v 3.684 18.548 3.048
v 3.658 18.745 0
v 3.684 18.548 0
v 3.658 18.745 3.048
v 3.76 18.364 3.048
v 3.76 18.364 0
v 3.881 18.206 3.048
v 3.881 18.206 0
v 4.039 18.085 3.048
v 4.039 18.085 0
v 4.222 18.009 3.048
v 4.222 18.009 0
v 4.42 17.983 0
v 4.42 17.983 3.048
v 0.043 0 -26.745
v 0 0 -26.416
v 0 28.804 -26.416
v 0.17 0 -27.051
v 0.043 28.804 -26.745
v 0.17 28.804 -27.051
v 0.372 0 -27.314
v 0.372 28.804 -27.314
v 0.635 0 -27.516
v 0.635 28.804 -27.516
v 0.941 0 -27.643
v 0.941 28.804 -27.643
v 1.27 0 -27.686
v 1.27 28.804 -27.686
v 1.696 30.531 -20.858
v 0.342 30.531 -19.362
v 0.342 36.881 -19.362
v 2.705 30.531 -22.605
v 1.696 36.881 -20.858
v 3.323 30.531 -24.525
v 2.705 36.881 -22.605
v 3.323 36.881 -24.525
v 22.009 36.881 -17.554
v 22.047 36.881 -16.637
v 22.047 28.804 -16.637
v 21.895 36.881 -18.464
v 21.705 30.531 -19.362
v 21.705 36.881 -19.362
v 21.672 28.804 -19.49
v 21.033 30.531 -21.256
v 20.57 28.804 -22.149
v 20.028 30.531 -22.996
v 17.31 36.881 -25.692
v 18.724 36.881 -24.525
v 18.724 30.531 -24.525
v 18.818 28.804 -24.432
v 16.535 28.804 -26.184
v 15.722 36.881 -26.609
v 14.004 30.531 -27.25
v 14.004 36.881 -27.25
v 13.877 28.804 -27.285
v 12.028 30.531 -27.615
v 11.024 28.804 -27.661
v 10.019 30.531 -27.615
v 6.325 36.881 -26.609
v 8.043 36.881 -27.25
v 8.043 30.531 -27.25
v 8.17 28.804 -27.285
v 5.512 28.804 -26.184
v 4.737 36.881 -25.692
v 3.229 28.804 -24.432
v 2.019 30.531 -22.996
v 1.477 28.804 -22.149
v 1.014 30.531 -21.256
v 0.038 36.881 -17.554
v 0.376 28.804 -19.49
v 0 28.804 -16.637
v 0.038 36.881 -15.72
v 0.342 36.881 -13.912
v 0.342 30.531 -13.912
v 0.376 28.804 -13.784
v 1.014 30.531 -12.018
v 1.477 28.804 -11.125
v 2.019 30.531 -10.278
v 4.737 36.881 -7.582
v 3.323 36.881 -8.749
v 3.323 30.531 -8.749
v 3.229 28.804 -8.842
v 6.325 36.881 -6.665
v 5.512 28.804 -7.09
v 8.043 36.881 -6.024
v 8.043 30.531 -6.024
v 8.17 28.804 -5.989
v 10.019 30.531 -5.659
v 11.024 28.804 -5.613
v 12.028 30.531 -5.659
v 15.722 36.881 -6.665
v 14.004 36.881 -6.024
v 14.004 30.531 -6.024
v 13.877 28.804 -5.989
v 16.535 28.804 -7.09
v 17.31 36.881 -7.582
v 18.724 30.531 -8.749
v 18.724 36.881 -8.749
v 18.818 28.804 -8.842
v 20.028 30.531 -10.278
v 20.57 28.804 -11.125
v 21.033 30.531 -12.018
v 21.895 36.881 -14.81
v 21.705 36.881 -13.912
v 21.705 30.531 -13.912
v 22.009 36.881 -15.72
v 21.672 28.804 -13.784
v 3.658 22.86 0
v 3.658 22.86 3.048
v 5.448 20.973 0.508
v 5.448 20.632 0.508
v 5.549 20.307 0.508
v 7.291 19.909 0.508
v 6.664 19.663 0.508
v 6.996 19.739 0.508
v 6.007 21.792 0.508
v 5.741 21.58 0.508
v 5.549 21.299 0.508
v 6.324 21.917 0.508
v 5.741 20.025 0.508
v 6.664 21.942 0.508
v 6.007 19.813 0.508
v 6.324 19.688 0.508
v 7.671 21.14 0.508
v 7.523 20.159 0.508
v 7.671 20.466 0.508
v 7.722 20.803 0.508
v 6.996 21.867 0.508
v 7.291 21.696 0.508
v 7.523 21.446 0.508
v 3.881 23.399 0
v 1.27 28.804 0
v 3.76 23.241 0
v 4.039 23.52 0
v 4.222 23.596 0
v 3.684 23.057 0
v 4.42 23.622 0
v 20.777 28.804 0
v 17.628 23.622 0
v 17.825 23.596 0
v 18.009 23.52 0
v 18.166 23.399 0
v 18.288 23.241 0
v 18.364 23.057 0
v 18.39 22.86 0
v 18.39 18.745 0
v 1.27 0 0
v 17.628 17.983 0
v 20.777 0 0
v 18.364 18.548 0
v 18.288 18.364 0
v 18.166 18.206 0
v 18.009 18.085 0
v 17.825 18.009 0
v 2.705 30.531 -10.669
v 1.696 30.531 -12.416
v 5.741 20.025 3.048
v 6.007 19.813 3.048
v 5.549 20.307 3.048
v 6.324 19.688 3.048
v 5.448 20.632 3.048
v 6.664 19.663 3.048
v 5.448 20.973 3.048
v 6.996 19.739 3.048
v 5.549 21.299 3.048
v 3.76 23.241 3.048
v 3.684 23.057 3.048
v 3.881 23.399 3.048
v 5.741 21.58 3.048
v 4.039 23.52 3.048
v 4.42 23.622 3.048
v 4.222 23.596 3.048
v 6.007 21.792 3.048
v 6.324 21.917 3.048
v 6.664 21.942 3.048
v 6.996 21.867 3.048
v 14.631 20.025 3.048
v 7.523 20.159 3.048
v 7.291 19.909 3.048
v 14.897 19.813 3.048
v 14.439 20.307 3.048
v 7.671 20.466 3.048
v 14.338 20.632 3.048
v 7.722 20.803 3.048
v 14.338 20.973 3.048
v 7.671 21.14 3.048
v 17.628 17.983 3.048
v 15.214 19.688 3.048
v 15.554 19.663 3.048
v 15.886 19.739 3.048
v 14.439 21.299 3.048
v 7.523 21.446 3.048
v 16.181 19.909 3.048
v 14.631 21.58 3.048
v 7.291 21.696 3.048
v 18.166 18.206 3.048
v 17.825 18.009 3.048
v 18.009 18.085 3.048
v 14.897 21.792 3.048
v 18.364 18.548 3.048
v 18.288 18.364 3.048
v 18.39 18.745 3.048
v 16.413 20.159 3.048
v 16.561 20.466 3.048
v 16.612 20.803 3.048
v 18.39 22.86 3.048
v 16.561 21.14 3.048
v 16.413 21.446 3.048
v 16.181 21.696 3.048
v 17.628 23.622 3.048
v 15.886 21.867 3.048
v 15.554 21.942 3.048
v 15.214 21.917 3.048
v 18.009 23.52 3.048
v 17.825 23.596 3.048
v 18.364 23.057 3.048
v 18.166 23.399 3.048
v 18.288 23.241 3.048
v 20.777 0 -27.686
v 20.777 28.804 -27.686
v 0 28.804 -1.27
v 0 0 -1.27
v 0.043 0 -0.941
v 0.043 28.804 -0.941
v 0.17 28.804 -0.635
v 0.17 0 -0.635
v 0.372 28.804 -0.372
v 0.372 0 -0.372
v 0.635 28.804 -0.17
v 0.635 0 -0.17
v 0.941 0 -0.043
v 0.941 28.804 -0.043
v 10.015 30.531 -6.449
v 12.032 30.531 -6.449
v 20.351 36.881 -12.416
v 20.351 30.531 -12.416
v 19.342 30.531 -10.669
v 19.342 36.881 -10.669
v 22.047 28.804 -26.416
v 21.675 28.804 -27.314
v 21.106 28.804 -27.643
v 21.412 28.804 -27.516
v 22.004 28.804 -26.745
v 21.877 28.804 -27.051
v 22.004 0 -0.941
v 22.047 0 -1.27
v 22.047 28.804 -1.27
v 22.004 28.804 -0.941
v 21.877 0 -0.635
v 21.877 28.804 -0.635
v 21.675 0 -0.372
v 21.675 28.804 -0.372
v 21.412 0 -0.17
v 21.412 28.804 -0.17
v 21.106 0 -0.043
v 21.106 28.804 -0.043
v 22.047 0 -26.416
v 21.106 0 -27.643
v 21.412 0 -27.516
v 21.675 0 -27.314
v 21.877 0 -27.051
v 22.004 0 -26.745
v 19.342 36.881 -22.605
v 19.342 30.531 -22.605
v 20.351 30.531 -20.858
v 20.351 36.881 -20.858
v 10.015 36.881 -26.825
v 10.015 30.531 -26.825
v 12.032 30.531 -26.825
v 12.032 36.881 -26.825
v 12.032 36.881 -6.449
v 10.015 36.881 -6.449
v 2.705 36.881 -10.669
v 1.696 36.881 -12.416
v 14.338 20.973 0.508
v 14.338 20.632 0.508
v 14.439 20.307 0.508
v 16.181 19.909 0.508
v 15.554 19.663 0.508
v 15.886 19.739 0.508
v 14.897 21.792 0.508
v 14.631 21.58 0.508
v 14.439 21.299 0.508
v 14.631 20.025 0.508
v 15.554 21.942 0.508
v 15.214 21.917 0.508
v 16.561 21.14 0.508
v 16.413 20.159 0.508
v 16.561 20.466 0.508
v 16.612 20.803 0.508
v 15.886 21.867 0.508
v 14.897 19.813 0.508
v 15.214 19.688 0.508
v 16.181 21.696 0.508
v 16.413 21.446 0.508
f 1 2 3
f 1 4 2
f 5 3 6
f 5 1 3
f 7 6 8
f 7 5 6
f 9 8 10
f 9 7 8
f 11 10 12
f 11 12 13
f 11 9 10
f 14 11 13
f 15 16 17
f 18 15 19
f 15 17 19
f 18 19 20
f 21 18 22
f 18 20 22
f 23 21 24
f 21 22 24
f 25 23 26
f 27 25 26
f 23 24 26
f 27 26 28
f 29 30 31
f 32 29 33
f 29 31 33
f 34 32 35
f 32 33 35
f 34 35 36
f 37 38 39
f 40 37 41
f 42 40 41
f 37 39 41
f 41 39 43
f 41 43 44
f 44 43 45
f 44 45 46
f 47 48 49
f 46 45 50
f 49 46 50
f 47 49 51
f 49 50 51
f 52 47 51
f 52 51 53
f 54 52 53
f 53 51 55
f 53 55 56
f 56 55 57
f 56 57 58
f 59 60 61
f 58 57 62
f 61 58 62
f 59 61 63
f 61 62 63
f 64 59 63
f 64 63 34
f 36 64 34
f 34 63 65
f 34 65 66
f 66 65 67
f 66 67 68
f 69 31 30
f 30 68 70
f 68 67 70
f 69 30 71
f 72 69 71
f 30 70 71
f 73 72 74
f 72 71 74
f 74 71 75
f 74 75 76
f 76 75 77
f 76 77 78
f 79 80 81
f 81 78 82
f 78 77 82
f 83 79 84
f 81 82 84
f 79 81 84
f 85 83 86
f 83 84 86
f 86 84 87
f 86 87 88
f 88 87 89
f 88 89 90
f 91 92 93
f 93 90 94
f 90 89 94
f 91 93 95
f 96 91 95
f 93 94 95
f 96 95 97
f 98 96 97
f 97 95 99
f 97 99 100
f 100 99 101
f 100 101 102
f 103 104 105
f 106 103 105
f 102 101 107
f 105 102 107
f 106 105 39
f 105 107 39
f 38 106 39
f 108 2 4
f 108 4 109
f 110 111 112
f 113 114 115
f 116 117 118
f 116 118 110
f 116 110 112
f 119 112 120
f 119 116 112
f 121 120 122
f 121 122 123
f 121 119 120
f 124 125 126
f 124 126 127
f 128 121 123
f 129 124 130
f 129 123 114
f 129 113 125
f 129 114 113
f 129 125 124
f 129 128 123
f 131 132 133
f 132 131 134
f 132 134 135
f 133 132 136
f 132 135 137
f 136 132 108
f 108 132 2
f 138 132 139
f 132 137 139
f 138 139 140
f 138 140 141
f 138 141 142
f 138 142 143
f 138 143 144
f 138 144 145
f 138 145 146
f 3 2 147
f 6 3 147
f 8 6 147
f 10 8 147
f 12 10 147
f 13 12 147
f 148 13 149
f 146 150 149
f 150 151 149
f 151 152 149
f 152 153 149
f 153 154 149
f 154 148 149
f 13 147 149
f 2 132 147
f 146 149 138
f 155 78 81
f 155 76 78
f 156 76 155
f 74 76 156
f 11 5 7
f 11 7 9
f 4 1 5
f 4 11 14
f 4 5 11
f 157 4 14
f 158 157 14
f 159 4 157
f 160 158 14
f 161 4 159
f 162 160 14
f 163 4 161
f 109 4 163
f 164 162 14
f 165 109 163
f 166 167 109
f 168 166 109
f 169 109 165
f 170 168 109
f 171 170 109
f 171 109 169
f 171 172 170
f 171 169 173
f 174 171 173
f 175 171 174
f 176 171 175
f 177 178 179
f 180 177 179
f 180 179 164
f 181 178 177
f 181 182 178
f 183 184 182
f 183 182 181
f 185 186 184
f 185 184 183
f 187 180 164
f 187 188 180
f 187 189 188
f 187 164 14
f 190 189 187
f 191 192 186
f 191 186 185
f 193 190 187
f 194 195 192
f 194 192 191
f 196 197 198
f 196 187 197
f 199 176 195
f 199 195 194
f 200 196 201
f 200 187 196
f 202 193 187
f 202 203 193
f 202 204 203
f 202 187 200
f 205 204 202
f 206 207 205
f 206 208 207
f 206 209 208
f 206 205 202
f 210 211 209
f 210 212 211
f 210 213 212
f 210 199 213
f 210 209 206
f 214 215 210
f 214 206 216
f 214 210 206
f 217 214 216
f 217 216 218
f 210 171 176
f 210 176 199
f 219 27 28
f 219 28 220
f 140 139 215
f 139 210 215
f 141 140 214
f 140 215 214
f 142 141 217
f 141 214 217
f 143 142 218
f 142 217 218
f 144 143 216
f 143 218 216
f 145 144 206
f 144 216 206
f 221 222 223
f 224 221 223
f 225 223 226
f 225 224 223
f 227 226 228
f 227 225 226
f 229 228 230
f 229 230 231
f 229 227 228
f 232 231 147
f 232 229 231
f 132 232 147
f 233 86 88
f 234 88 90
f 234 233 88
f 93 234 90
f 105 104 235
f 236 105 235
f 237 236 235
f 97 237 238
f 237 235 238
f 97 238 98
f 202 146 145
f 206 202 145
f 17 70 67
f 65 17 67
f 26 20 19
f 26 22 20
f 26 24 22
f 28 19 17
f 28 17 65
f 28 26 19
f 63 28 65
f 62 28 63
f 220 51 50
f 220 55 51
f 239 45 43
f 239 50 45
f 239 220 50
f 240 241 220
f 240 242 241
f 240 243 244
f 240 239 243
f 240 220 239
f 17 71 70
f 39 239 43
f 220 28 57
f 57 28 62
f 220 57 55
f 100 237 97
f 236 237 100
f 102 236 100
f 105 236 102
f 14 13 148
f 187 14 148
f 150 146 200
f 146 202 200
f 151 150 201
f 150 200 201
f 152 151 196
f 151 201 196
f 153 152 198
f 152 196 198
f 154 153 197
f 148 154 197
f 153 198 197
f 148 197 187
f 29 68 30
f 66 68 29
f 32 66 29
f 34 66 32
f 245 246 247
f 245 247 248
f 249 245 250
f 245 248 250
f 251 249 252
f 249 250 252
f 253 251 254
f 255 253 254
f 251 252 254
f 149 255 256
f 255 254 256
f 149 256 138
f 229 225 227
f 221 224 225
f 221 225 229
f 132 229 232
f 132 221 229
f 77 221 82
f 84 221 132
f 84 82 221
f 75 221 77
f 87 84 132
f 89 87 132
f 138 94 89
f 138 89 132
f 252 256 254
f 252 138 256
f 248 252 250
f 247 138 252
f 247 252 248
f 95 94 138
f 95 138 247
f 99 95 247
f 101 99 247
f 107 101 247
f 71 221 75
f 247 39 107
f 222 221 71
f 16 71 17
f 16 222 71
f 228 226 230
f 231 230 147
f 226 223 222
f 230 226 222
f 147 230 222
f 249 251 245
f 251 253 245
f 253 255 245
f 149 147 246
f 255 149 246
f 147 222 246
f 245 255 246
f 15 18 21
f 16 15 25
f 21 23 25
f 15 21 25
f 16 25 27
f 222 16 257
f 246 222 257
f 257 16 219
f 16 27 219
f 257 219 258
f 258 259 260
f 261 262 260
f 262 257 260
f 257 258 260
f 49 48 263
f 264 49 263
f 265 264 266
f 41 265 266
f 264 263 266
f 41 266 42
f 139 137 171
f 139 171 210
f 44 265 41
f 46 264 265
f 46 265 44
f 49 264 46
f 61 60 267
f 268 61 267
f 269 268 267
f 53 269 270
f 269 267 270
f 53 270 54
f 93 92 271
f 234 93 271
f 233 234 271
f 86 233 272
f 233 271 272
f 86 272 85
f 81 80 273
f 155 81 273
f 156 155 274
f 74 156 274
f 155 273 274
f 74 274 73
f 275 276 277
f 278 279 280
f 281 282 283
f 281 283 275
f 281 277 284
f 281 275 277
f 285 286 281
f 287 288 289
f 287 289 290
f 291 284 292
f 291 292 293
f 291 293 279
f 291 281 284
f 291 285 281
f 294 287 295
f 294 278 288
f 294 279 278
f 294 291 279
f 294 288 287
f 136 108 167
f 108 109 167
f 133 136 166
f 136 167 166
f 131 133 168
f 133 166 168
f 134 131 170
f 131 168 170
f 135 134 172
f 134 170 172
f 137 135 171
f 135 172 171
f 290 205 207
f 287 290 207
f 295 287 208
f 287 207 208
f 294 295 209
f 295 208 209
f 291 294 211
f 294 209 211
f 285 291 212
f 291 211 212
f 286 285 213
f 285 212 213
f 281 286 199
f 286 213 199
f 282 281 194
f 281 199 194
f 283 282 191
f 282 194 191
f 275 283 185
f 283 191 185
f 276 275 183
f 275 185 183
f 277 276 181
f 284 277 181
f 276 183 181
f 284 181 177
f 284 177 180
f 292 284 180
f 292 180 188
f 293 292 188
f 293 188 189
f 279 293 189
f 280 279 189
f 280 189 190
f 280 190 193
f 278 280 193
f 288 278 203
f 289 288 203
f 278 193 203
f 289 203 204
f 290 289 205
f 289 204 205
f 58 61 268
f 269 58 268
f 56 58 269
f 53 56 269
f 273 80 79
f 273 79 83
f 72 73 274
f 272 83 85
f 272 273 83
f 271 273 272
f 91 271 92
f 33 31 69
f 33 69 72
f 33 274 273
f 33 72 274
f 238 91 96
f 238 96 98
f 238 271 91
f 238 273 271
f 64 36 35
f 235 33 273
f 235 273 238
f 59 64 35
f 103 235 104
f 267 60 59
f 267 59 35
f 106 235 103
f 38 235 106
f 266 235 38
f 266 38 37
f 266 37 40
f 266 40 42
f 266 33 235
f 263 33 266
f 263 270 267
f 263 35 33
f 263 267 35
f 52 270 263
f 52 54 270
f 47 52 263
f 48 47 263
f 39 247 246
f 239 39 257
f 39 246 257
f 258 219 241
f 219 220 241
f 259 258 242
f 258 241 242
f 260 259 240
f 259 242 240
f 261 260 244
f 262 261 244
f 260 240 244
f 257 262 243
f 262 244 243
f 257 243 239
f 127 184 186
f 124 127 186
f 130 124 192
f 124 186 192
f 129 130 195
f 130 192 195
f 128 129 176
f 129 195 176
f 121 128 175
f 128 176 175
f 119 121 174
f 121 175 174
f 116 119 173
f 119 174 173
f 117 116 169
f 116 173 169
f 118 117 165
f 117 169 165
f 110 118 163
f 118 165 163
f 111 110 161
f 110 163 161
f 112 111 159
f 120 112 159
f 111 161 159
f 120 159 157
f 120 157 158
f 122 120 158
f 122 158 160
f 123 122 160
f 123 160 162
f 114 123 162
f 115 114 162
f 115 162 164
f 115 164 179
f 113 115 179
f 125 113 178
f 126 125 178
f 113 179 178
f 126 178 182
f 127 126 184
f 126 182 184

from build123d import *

# Parameters (mm, degrees)
SKETCH1_W           = 22.0472
SKETCH1_H           = 27.686
BOSS_EXTRUDE1_DEPTH = 28.8036
SKETCH2_W           = 14.732
SKETCH2_H           = 5.6388
BOSS_EXTRUDE2_DEPTH = 3.048
SKETCH3_R           = 11.0236
BOSS_EXTRUDE3_DEPTH = 8.0772
SKETCH4_R           = 9.525
CUT_EXTRUDE1_DEPTH  = 6.35
FILLET1_R           = 1.27
FILLET2_R           = 0.762
SKETCH5_R           = 1.143
CUT_EXTRUDE2_DEPTH  = 2.54


with BuildPart() as part:
    # Sketch1 → Boss-Extrude1 (new body)
    with BuildSketch(Plane(origin=(0, 0, 0), x_dir=(1, 0, 0), z_dir=(0, 1, 0))):
        with Locations((11.0236, 13.843)):
            Rectangle(SKETCH1_W, SKETCH1_H)
    extrude(amount=BOSS_EXTRUDE1_DEPTH)

    # Sketch2 → Boss-Extrude2 (add)
    with BuildSketch(Plane.XY):
        with Locations((11.0236, 20.8026)):
            Rectangle(SKETCH2_W, SKETCH2_H)
    extrude(amount=BOSS_EXTRUDE2_DEPTH)

    # Sketch3 → Boss-Extrude3 (add)
    with BuildSketch(Plane(origin=(0, 28.8036, 0), x_dir=(1, 0, 0), z_dir=(0, 1, 0))):
        with Locations((11.0236, 16.637)):
            Circle(SKETCH3_R)
    extrude(amount=BOSS_EXTRUDE3_DEPTH)

    # Sketch4 → Cut-Extrude1 (cut)
    with BuildSketch(Plane(origin=(0, 36.8808, 0), x_dir=(1, 0, 0), z_dir=(0, 1, 0))):
        with Locations((11.0236, 36.2966)):
            Circle(SKETCH4_R)
        with Locations((28.049313028, 26.4668)):
            Circle(SKETCH4_R)
        with Locations((28.049313028, 6.8072)):
            Circle(SKETCH4_R)
        with Locations((11.0236, -3.0226)):
            Circle(SKETCH4_R)
        with Locations((-6.002113028, 6.8072)):
            Circle(SKETCH4_R)
        with Locations((-6.002113028, 26.4668)):
            Circle(SKETCH4_R)
    extrude(amount=-CUT_EXTRUDE1_DEPTH, mode=Mode.SUBTRACT)

    # Fillet1
    fillet1_edges = [part.edges().sort_by_distance(p)[0] for p in [
        (0, 14.4018, -27.686),
        (22.0472, 14.4018, -27.686),
        (22.0472, 14.4018, 0),
        (0, 14.4018, 0),
    ]]
    fillet(fillet1_edges, radius=FILLET1_R)

    # Fillet2
    fillet2_edges = [part.edges().sort_by_distance(p)[0] for p in [
        (18.3896, 17.9832, 1.524),
        (18.3896, 23.622, 1.524),
        (3.6576, 23.622, 1.524),
        (3.6576, 17.9832, 1.524),
    ]]
    fillet(fillet2_edges, radius=FILLET2_R)

    # Sketch5 → Cut-Extrude2 (cut)
    with BuildSketch(Plane.XY.offset(3.048)):
        with Locations((6.5786, 20.8026)):
            Circle(SKETCH5_R)
        with Locations((15.4686, 20.8026)):
            Circle(SKETCH5_R)
    extrude(amount=-CUT_EXTRUDE2_DEPTH, mode=Mode.SUBTRACT)


solid = part.part
